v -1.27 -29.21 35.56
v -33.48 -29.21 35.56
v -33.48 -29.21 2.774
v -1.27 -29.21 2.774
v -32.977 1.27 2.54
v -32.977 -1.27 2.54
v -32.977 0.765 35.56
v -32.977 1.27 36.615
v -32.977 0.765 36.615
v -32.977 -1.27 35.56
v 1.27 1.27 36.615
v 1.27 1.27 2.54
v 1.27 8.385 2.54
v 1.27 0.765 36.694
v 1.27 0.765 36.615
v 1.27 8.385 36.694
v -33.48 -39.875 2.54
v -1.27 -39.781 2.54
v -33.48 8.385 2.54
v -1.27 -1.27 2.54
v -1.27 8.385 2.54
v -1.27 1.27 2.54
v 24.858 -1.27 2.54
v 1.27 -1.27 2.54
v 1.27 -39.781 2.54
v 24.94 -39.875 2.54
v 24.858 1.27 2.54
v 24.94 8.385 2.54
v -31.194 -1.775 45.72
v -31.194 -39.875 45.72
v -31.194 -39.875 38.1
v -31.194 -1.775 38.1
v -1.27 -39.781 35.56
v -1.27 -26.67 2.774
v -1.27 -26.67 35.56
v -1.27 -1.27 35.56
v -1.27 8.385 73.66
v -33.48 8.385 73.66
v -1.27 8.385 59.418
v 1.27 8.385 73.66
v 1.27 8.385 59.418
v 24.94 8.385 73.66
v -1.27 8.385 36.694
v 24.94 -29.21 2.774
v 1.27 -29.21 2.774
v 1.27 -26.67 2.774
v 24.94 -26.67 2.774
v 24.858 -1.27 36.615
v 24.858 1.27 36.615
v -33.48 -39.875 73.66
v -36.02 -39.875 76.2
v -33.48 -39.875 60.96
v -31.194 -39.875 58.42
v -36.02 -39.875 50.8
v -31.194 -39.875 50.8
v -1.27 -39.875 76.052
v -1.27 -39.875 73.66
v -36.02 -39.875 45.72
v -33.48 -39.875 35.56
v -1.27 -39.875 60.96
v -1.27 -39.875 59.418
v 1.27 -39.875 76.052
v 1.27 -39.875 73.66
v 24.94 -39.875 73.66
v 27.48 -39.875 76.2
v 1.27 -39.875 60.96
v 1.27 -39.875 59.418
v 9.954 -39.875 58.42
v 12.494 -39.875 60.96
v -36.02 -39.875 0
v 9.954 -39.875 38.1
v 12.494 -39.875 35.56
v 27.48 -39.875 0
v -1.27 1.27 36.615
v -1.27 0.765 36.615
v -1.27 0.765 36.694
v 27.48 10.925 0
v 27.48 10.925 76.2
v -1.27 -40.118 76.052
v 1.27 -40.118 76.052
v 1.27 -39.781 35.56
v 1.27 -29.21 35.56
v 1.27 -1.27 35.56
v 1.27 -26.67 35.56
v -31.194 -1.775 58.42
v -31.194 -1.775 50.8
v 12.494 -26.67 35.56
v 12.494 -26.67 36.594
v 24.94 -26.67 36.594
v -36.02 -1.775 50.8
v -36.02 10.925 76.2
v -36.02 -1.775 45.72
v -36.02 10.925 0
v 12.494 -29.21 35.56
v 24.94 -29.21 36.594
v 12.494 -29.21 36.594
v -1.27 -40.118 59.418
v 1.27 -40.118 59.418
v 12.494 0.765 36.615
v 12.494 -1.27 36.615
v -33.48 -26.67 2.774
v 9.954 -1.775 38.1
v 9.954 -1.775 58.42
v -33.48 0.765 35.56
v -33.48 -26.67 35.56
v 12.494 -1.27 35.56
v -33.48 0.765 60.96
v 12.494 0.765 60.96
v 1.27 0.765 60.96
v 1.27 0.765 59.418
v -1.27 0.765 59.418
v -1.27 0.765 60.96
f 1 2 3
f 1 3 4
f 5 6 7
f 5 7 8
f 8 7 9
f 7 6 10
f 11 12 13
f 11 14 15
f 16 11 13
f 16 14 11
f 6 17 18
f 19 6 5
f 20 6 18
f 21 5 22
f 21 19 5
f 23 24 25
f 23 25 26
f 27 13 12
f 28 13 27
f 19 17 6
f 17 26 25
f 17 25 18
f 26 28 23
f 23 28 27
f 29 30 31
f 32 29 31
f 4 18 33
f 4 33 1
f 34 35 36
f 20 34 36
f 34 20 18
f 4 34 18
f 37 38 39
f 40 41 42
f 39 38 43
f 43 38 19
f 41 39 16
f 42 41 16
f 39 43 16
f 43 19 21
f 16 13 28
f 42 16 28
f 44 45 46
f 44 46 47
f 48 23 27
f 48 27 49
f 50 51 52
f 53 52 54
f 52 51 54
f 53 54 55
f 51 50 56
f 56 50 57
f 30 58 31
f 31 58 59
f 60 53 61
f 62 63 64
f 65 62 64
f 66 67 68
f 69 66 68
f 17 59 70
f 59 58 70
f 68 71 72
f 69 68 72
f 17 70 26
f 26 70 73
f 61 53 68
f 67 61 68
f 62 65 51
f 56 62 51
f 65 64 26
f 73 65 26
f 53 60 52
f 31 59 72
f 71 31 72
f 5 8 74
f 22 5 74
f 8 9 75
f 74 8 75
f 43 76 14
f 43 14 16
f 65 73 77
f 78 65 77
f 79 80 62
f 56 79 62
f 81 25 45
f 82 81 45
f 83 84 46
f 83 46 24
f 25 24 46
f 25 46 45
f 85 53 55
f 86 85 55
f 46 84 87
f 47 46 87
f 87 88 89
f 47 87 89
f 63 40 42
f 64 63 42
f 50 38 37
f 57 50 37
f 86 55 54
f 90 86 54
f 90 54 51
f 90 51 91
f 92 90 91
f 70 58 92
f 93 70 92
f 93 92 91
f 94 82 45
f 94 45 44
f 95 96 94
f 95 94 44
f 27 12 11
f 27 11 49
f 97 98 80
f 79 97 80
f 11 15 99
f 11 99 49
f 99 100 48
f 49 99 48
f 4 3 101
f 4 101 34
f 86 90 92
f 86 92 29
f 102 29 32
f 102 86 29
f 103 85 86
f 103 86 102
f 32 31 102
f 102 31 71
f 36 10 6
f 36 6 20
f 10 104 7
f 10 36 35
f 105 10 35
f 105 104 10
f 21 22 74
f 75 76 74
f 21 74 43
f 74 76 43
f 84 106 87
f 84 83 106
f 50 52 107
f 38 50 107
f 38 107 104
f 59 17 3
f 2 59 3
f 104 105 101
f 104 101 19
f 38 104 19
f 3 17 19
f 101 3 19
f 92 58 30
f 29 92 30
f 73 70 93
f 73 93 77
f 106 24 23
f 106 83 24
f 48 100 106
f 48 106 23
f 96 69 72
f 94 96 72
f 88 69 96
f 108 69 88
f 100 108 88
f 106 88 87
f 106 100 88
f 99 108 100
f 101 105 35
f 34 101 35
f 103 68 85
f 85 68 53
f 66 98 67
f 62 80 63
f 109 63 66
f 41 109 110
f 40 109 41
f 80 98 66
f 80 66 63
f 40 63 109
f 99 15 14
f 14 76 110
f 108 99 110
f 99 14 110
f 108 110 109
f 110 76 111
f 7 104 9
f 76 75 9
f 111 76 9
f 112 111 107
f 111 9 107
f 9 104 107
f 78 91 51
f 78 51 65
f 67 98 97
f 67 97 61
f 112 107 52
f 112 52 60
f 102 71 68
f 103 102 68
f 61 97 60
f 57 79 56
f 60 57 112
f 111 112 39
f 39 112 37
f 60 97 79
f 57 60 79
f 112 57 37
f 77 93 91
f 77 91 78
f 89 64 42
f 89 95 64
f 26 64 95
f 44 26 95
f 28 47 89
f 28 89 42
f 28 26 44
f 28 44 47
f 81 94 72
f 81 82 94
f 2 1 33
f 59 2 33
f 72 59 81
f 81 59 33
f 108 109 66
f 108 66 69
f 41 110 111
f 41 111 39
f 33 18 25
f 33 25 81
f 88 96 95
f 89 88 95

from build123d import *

# Parameters (mm, degrees)
F0_W         = 63.5
F0_H         = 50.8
F1_DEPTH     = 76.2
F3_DEPTH     = 38.1
F4_T         = 2.54
F4_T3_DEPTH  = 9.906
F4_T5_DEPTH  = 46.228
F4_T7_DEPTH  = 12.7
F4_T9_DEPTH  = 12.7
F4_T11_DEPTH = 25.4
F4_T13_DEPTH = 43.18
F5_W         = 49.4960099459
F5_H         = 36.6942100227
F5_W_2       = 49.6212309226
F5_H_2       = 16.634516418
F6_DEPTH     = 1.27
F7_W         = 57.8342098743
F7_H         = 36.6147905588
F8_DEPTH     = 1.27
F10_W        = 61.5059640259
F10_H        = 33.8196810335
F11_DEPTH    = 1.27


# Not quite as in the source:
# - a shell that OpenCascade refuses in one call is made with other operations: the cavity is built on its own and cut out


with BuildPart() as f1:
    # F0 (on Top) → F1 (new body)
    with BuildSketch(Plane.XY):
        with Locations((-4.2696721688, -14.4747652373)):
            Rectangle(F0_W, F0_H)
    extrude(amount=F1_DEPTH)

    # F2 (on face) → F3 (cut)
    with BuildSketch(Plane.XZ.offset(39.8747652373)):
        Polygon((9.9543278312, 58.42), (-31.1936721688, 58.42), (-31.1936721688, 50.8), (-39.8653410375, 50.8), (-39.8653410375, 45.72), (-31.1936721688, 45.72), (-31.1936721688, 38.1), (9.9543278312, 38.1), align=None)
    extrude(amount=-F3_DEPTH, mode=Mode.SUBTRACT)

    # F4: shell of thickness 2.54, made by hand


with BuildPart() as f4_core1:
    # F4_t2: copy of F1
    add(f1.part)

    # the walls: a layer under each face that stays
    f4_faces = [f4_core1.faces().sort_by_distance(p)[0] for p in [
        (-4.2696721688, 10.9252347627, 38.1),
        (27.4803278312, -14.4747652373, 38.1),
        (-36.0196721688, -14.4747652373, 38.1),
        (-4.2696721688, -14.4747652373, 0),
        (-4.2696721688, -14.4747652373, 76.2),
        (-33.6066721688, -20.8247652373, 45.72),
        (-13.0326721688, -1.7747652373, 48.26),
        (-33.6066721688, -20.8247652373, 50.8),
        (-31.1936721688, -20.8247652373, 54.61),
        (-10.6196721688, -20.8247652373, 58.42),
        (9.9543278312, -20.8247652373, 48.26),
        (-10.6196721688, -20.8247652373, 38.1),
        (-31.1936721688, -20.8247652373, 41.91),
    ]]
    thicken(f4_faces, amount=-F4_T, mode=Mode.SUBTRACT)

    # F4_s4 → F4_t3 (cut)
    with BuildSketch(Plane.YZ.offset(-38.5596721688)):
        Polygon((-1.8001652373, 45.7454), (-1.7747652373, 43.18), (0.7652347627, 43.18), (0.7652347627, 45.72), align=None)
        Polygon((-1.8001652373, 50.7746), (0.7652347627, 50.8), (0.7652347627, 53.34), (-1.7747652373, 53.34), align=None)
    extrude(amount=F4_T3_DEPTH, mode=Mode.SUBTRACT)

    # F4_s6 → F4_t5 (cut)
    with BuildSketch(Plane.YZ.offset(-33.7336721688)):
        Polygon((-1.8001652373, 38.1254), (0.7652347627, 38.1), (0.7652347627, 35.56), (-1.7747652373, 35.56), align=None)
        Polygon((-1.8001652373, 58.3946), (0.7652347627, 58.42), (0.7652347627, 60.96), (-1.7747652373, 60.96), align=None)
    extrude(amount=F4_T5_DEPTH, mode=Mode.SUBTRACT)

    # F4_s8 → F4_t7 (cut)
    with BuildSketch(Plane.XY.offset(35.56)):
        Polygon((-31.1682721688, -1.8001652373), (-31.1936721688, 0.7652347627), (-33.7336721688, 0.7652347627), (-33.7336721688, -1.7747652373), align=None)
    extrude(amount=F4_T7_DEPTH, mode=Mode.SUBTRACT)

    # F4_s10 → F4_t9 (cut)
    with BuildSketch(Plane.XY.offset(48.26)):
        Polygon((-31.1682721688, -1.8001652373), (-31.1936721688, 0.7652347627), (-33.7336721688, 0.7652347627), (-33.7336721688, -1.7747652373), align=None)
    extrude(amount=F4_T9_DEPTH, mode=Mode.SUBTRACT)

    # F4_s12 → F4_t11 (cut)
    with BuildSketch(Plane.XY.offset(35.56)):
        Polygon((9.9289278312, -1.8001652373), (9.9543278312, 0.7652347627), (12.4943278312, 0.7652347627), (12.4943278312, -1.7747652373), align=None)
    extrude(amount=F4_T11_DEPTH, mode=Mode.SUBTRACT)

    # F4_s14 → F4_t13 (cut)
    with BuildSketch(Plane.XZ.offset(-0.7652347627)):
        Polygon((-31.1682721688, 58.3946), (-33.7336721688, 58.42), (-33.7336721688, 60.96), (-31.1936721688, 60.96), align=None)
        Polygon((9.9289278312, 58.3946), (9.9543278312, 60.96), (12.4943278312, 60.96), (12.4943278312, 58.42), align=None)
        Polygon((9.9289278312, 38.1254), (12.4943278312, 38.1), (12.4943278312, 35.56), (9.9543278312, 35.56), align=None)
        Polygon((-31.1682721688, 38.1254), (-31.1936721688, 35.56), (-33.7336721688, 35.56), (-33.7336721688, 38.1), align=None)
    extrude(amount=F4_T13_DEPTH, mode=Mode.SUBTRACT)


with BuildPart() as f1_1:
    add(f1.part)

    # what is left inside the walls is the cavity
    f4_cavity = [f4_core1.part.solids().sort_by_distance(p)[0] for p in [
        (-4.269672, 8.359835, 49.953333),
    ]]
    add(f4_cavity, mode=Mode.SUBTRACT)

    # F5 (on Right) → F6 (join, symmetric)
    with BuildSketch(Plane.YZ):
        with Locations((-15.0325410068, 18.3471050113)):
            Rectangle(F5_W, F5_H)
        with Locations((-15.3072369285, 67.7350275218)):
            Rectangle(F5_W_2, F5_H_2)
    extrude(amount=F6_DEPTH, both=True)

    # F7 (on Front) → F8 (join, symmetric)
    with BuildSketch(Plane.XZ):
        with Locations((-4.0594032034, 18.3073952794)):
            Rectangle(F7_W, F7_H)
    extrude(amount=F8_DEPTH, both=True)

    # F10 (on offset) → F11 (join, symmetric)
    with BuildSketch(Plane.XZ.offset(27.94)):
        with Locations((-4.893549718, 19.6837866679)):
            Rectangle(F10_W, F10_H)
    extrude(amount=F11_DEPTH, both=True)


solid = f1_1.part
